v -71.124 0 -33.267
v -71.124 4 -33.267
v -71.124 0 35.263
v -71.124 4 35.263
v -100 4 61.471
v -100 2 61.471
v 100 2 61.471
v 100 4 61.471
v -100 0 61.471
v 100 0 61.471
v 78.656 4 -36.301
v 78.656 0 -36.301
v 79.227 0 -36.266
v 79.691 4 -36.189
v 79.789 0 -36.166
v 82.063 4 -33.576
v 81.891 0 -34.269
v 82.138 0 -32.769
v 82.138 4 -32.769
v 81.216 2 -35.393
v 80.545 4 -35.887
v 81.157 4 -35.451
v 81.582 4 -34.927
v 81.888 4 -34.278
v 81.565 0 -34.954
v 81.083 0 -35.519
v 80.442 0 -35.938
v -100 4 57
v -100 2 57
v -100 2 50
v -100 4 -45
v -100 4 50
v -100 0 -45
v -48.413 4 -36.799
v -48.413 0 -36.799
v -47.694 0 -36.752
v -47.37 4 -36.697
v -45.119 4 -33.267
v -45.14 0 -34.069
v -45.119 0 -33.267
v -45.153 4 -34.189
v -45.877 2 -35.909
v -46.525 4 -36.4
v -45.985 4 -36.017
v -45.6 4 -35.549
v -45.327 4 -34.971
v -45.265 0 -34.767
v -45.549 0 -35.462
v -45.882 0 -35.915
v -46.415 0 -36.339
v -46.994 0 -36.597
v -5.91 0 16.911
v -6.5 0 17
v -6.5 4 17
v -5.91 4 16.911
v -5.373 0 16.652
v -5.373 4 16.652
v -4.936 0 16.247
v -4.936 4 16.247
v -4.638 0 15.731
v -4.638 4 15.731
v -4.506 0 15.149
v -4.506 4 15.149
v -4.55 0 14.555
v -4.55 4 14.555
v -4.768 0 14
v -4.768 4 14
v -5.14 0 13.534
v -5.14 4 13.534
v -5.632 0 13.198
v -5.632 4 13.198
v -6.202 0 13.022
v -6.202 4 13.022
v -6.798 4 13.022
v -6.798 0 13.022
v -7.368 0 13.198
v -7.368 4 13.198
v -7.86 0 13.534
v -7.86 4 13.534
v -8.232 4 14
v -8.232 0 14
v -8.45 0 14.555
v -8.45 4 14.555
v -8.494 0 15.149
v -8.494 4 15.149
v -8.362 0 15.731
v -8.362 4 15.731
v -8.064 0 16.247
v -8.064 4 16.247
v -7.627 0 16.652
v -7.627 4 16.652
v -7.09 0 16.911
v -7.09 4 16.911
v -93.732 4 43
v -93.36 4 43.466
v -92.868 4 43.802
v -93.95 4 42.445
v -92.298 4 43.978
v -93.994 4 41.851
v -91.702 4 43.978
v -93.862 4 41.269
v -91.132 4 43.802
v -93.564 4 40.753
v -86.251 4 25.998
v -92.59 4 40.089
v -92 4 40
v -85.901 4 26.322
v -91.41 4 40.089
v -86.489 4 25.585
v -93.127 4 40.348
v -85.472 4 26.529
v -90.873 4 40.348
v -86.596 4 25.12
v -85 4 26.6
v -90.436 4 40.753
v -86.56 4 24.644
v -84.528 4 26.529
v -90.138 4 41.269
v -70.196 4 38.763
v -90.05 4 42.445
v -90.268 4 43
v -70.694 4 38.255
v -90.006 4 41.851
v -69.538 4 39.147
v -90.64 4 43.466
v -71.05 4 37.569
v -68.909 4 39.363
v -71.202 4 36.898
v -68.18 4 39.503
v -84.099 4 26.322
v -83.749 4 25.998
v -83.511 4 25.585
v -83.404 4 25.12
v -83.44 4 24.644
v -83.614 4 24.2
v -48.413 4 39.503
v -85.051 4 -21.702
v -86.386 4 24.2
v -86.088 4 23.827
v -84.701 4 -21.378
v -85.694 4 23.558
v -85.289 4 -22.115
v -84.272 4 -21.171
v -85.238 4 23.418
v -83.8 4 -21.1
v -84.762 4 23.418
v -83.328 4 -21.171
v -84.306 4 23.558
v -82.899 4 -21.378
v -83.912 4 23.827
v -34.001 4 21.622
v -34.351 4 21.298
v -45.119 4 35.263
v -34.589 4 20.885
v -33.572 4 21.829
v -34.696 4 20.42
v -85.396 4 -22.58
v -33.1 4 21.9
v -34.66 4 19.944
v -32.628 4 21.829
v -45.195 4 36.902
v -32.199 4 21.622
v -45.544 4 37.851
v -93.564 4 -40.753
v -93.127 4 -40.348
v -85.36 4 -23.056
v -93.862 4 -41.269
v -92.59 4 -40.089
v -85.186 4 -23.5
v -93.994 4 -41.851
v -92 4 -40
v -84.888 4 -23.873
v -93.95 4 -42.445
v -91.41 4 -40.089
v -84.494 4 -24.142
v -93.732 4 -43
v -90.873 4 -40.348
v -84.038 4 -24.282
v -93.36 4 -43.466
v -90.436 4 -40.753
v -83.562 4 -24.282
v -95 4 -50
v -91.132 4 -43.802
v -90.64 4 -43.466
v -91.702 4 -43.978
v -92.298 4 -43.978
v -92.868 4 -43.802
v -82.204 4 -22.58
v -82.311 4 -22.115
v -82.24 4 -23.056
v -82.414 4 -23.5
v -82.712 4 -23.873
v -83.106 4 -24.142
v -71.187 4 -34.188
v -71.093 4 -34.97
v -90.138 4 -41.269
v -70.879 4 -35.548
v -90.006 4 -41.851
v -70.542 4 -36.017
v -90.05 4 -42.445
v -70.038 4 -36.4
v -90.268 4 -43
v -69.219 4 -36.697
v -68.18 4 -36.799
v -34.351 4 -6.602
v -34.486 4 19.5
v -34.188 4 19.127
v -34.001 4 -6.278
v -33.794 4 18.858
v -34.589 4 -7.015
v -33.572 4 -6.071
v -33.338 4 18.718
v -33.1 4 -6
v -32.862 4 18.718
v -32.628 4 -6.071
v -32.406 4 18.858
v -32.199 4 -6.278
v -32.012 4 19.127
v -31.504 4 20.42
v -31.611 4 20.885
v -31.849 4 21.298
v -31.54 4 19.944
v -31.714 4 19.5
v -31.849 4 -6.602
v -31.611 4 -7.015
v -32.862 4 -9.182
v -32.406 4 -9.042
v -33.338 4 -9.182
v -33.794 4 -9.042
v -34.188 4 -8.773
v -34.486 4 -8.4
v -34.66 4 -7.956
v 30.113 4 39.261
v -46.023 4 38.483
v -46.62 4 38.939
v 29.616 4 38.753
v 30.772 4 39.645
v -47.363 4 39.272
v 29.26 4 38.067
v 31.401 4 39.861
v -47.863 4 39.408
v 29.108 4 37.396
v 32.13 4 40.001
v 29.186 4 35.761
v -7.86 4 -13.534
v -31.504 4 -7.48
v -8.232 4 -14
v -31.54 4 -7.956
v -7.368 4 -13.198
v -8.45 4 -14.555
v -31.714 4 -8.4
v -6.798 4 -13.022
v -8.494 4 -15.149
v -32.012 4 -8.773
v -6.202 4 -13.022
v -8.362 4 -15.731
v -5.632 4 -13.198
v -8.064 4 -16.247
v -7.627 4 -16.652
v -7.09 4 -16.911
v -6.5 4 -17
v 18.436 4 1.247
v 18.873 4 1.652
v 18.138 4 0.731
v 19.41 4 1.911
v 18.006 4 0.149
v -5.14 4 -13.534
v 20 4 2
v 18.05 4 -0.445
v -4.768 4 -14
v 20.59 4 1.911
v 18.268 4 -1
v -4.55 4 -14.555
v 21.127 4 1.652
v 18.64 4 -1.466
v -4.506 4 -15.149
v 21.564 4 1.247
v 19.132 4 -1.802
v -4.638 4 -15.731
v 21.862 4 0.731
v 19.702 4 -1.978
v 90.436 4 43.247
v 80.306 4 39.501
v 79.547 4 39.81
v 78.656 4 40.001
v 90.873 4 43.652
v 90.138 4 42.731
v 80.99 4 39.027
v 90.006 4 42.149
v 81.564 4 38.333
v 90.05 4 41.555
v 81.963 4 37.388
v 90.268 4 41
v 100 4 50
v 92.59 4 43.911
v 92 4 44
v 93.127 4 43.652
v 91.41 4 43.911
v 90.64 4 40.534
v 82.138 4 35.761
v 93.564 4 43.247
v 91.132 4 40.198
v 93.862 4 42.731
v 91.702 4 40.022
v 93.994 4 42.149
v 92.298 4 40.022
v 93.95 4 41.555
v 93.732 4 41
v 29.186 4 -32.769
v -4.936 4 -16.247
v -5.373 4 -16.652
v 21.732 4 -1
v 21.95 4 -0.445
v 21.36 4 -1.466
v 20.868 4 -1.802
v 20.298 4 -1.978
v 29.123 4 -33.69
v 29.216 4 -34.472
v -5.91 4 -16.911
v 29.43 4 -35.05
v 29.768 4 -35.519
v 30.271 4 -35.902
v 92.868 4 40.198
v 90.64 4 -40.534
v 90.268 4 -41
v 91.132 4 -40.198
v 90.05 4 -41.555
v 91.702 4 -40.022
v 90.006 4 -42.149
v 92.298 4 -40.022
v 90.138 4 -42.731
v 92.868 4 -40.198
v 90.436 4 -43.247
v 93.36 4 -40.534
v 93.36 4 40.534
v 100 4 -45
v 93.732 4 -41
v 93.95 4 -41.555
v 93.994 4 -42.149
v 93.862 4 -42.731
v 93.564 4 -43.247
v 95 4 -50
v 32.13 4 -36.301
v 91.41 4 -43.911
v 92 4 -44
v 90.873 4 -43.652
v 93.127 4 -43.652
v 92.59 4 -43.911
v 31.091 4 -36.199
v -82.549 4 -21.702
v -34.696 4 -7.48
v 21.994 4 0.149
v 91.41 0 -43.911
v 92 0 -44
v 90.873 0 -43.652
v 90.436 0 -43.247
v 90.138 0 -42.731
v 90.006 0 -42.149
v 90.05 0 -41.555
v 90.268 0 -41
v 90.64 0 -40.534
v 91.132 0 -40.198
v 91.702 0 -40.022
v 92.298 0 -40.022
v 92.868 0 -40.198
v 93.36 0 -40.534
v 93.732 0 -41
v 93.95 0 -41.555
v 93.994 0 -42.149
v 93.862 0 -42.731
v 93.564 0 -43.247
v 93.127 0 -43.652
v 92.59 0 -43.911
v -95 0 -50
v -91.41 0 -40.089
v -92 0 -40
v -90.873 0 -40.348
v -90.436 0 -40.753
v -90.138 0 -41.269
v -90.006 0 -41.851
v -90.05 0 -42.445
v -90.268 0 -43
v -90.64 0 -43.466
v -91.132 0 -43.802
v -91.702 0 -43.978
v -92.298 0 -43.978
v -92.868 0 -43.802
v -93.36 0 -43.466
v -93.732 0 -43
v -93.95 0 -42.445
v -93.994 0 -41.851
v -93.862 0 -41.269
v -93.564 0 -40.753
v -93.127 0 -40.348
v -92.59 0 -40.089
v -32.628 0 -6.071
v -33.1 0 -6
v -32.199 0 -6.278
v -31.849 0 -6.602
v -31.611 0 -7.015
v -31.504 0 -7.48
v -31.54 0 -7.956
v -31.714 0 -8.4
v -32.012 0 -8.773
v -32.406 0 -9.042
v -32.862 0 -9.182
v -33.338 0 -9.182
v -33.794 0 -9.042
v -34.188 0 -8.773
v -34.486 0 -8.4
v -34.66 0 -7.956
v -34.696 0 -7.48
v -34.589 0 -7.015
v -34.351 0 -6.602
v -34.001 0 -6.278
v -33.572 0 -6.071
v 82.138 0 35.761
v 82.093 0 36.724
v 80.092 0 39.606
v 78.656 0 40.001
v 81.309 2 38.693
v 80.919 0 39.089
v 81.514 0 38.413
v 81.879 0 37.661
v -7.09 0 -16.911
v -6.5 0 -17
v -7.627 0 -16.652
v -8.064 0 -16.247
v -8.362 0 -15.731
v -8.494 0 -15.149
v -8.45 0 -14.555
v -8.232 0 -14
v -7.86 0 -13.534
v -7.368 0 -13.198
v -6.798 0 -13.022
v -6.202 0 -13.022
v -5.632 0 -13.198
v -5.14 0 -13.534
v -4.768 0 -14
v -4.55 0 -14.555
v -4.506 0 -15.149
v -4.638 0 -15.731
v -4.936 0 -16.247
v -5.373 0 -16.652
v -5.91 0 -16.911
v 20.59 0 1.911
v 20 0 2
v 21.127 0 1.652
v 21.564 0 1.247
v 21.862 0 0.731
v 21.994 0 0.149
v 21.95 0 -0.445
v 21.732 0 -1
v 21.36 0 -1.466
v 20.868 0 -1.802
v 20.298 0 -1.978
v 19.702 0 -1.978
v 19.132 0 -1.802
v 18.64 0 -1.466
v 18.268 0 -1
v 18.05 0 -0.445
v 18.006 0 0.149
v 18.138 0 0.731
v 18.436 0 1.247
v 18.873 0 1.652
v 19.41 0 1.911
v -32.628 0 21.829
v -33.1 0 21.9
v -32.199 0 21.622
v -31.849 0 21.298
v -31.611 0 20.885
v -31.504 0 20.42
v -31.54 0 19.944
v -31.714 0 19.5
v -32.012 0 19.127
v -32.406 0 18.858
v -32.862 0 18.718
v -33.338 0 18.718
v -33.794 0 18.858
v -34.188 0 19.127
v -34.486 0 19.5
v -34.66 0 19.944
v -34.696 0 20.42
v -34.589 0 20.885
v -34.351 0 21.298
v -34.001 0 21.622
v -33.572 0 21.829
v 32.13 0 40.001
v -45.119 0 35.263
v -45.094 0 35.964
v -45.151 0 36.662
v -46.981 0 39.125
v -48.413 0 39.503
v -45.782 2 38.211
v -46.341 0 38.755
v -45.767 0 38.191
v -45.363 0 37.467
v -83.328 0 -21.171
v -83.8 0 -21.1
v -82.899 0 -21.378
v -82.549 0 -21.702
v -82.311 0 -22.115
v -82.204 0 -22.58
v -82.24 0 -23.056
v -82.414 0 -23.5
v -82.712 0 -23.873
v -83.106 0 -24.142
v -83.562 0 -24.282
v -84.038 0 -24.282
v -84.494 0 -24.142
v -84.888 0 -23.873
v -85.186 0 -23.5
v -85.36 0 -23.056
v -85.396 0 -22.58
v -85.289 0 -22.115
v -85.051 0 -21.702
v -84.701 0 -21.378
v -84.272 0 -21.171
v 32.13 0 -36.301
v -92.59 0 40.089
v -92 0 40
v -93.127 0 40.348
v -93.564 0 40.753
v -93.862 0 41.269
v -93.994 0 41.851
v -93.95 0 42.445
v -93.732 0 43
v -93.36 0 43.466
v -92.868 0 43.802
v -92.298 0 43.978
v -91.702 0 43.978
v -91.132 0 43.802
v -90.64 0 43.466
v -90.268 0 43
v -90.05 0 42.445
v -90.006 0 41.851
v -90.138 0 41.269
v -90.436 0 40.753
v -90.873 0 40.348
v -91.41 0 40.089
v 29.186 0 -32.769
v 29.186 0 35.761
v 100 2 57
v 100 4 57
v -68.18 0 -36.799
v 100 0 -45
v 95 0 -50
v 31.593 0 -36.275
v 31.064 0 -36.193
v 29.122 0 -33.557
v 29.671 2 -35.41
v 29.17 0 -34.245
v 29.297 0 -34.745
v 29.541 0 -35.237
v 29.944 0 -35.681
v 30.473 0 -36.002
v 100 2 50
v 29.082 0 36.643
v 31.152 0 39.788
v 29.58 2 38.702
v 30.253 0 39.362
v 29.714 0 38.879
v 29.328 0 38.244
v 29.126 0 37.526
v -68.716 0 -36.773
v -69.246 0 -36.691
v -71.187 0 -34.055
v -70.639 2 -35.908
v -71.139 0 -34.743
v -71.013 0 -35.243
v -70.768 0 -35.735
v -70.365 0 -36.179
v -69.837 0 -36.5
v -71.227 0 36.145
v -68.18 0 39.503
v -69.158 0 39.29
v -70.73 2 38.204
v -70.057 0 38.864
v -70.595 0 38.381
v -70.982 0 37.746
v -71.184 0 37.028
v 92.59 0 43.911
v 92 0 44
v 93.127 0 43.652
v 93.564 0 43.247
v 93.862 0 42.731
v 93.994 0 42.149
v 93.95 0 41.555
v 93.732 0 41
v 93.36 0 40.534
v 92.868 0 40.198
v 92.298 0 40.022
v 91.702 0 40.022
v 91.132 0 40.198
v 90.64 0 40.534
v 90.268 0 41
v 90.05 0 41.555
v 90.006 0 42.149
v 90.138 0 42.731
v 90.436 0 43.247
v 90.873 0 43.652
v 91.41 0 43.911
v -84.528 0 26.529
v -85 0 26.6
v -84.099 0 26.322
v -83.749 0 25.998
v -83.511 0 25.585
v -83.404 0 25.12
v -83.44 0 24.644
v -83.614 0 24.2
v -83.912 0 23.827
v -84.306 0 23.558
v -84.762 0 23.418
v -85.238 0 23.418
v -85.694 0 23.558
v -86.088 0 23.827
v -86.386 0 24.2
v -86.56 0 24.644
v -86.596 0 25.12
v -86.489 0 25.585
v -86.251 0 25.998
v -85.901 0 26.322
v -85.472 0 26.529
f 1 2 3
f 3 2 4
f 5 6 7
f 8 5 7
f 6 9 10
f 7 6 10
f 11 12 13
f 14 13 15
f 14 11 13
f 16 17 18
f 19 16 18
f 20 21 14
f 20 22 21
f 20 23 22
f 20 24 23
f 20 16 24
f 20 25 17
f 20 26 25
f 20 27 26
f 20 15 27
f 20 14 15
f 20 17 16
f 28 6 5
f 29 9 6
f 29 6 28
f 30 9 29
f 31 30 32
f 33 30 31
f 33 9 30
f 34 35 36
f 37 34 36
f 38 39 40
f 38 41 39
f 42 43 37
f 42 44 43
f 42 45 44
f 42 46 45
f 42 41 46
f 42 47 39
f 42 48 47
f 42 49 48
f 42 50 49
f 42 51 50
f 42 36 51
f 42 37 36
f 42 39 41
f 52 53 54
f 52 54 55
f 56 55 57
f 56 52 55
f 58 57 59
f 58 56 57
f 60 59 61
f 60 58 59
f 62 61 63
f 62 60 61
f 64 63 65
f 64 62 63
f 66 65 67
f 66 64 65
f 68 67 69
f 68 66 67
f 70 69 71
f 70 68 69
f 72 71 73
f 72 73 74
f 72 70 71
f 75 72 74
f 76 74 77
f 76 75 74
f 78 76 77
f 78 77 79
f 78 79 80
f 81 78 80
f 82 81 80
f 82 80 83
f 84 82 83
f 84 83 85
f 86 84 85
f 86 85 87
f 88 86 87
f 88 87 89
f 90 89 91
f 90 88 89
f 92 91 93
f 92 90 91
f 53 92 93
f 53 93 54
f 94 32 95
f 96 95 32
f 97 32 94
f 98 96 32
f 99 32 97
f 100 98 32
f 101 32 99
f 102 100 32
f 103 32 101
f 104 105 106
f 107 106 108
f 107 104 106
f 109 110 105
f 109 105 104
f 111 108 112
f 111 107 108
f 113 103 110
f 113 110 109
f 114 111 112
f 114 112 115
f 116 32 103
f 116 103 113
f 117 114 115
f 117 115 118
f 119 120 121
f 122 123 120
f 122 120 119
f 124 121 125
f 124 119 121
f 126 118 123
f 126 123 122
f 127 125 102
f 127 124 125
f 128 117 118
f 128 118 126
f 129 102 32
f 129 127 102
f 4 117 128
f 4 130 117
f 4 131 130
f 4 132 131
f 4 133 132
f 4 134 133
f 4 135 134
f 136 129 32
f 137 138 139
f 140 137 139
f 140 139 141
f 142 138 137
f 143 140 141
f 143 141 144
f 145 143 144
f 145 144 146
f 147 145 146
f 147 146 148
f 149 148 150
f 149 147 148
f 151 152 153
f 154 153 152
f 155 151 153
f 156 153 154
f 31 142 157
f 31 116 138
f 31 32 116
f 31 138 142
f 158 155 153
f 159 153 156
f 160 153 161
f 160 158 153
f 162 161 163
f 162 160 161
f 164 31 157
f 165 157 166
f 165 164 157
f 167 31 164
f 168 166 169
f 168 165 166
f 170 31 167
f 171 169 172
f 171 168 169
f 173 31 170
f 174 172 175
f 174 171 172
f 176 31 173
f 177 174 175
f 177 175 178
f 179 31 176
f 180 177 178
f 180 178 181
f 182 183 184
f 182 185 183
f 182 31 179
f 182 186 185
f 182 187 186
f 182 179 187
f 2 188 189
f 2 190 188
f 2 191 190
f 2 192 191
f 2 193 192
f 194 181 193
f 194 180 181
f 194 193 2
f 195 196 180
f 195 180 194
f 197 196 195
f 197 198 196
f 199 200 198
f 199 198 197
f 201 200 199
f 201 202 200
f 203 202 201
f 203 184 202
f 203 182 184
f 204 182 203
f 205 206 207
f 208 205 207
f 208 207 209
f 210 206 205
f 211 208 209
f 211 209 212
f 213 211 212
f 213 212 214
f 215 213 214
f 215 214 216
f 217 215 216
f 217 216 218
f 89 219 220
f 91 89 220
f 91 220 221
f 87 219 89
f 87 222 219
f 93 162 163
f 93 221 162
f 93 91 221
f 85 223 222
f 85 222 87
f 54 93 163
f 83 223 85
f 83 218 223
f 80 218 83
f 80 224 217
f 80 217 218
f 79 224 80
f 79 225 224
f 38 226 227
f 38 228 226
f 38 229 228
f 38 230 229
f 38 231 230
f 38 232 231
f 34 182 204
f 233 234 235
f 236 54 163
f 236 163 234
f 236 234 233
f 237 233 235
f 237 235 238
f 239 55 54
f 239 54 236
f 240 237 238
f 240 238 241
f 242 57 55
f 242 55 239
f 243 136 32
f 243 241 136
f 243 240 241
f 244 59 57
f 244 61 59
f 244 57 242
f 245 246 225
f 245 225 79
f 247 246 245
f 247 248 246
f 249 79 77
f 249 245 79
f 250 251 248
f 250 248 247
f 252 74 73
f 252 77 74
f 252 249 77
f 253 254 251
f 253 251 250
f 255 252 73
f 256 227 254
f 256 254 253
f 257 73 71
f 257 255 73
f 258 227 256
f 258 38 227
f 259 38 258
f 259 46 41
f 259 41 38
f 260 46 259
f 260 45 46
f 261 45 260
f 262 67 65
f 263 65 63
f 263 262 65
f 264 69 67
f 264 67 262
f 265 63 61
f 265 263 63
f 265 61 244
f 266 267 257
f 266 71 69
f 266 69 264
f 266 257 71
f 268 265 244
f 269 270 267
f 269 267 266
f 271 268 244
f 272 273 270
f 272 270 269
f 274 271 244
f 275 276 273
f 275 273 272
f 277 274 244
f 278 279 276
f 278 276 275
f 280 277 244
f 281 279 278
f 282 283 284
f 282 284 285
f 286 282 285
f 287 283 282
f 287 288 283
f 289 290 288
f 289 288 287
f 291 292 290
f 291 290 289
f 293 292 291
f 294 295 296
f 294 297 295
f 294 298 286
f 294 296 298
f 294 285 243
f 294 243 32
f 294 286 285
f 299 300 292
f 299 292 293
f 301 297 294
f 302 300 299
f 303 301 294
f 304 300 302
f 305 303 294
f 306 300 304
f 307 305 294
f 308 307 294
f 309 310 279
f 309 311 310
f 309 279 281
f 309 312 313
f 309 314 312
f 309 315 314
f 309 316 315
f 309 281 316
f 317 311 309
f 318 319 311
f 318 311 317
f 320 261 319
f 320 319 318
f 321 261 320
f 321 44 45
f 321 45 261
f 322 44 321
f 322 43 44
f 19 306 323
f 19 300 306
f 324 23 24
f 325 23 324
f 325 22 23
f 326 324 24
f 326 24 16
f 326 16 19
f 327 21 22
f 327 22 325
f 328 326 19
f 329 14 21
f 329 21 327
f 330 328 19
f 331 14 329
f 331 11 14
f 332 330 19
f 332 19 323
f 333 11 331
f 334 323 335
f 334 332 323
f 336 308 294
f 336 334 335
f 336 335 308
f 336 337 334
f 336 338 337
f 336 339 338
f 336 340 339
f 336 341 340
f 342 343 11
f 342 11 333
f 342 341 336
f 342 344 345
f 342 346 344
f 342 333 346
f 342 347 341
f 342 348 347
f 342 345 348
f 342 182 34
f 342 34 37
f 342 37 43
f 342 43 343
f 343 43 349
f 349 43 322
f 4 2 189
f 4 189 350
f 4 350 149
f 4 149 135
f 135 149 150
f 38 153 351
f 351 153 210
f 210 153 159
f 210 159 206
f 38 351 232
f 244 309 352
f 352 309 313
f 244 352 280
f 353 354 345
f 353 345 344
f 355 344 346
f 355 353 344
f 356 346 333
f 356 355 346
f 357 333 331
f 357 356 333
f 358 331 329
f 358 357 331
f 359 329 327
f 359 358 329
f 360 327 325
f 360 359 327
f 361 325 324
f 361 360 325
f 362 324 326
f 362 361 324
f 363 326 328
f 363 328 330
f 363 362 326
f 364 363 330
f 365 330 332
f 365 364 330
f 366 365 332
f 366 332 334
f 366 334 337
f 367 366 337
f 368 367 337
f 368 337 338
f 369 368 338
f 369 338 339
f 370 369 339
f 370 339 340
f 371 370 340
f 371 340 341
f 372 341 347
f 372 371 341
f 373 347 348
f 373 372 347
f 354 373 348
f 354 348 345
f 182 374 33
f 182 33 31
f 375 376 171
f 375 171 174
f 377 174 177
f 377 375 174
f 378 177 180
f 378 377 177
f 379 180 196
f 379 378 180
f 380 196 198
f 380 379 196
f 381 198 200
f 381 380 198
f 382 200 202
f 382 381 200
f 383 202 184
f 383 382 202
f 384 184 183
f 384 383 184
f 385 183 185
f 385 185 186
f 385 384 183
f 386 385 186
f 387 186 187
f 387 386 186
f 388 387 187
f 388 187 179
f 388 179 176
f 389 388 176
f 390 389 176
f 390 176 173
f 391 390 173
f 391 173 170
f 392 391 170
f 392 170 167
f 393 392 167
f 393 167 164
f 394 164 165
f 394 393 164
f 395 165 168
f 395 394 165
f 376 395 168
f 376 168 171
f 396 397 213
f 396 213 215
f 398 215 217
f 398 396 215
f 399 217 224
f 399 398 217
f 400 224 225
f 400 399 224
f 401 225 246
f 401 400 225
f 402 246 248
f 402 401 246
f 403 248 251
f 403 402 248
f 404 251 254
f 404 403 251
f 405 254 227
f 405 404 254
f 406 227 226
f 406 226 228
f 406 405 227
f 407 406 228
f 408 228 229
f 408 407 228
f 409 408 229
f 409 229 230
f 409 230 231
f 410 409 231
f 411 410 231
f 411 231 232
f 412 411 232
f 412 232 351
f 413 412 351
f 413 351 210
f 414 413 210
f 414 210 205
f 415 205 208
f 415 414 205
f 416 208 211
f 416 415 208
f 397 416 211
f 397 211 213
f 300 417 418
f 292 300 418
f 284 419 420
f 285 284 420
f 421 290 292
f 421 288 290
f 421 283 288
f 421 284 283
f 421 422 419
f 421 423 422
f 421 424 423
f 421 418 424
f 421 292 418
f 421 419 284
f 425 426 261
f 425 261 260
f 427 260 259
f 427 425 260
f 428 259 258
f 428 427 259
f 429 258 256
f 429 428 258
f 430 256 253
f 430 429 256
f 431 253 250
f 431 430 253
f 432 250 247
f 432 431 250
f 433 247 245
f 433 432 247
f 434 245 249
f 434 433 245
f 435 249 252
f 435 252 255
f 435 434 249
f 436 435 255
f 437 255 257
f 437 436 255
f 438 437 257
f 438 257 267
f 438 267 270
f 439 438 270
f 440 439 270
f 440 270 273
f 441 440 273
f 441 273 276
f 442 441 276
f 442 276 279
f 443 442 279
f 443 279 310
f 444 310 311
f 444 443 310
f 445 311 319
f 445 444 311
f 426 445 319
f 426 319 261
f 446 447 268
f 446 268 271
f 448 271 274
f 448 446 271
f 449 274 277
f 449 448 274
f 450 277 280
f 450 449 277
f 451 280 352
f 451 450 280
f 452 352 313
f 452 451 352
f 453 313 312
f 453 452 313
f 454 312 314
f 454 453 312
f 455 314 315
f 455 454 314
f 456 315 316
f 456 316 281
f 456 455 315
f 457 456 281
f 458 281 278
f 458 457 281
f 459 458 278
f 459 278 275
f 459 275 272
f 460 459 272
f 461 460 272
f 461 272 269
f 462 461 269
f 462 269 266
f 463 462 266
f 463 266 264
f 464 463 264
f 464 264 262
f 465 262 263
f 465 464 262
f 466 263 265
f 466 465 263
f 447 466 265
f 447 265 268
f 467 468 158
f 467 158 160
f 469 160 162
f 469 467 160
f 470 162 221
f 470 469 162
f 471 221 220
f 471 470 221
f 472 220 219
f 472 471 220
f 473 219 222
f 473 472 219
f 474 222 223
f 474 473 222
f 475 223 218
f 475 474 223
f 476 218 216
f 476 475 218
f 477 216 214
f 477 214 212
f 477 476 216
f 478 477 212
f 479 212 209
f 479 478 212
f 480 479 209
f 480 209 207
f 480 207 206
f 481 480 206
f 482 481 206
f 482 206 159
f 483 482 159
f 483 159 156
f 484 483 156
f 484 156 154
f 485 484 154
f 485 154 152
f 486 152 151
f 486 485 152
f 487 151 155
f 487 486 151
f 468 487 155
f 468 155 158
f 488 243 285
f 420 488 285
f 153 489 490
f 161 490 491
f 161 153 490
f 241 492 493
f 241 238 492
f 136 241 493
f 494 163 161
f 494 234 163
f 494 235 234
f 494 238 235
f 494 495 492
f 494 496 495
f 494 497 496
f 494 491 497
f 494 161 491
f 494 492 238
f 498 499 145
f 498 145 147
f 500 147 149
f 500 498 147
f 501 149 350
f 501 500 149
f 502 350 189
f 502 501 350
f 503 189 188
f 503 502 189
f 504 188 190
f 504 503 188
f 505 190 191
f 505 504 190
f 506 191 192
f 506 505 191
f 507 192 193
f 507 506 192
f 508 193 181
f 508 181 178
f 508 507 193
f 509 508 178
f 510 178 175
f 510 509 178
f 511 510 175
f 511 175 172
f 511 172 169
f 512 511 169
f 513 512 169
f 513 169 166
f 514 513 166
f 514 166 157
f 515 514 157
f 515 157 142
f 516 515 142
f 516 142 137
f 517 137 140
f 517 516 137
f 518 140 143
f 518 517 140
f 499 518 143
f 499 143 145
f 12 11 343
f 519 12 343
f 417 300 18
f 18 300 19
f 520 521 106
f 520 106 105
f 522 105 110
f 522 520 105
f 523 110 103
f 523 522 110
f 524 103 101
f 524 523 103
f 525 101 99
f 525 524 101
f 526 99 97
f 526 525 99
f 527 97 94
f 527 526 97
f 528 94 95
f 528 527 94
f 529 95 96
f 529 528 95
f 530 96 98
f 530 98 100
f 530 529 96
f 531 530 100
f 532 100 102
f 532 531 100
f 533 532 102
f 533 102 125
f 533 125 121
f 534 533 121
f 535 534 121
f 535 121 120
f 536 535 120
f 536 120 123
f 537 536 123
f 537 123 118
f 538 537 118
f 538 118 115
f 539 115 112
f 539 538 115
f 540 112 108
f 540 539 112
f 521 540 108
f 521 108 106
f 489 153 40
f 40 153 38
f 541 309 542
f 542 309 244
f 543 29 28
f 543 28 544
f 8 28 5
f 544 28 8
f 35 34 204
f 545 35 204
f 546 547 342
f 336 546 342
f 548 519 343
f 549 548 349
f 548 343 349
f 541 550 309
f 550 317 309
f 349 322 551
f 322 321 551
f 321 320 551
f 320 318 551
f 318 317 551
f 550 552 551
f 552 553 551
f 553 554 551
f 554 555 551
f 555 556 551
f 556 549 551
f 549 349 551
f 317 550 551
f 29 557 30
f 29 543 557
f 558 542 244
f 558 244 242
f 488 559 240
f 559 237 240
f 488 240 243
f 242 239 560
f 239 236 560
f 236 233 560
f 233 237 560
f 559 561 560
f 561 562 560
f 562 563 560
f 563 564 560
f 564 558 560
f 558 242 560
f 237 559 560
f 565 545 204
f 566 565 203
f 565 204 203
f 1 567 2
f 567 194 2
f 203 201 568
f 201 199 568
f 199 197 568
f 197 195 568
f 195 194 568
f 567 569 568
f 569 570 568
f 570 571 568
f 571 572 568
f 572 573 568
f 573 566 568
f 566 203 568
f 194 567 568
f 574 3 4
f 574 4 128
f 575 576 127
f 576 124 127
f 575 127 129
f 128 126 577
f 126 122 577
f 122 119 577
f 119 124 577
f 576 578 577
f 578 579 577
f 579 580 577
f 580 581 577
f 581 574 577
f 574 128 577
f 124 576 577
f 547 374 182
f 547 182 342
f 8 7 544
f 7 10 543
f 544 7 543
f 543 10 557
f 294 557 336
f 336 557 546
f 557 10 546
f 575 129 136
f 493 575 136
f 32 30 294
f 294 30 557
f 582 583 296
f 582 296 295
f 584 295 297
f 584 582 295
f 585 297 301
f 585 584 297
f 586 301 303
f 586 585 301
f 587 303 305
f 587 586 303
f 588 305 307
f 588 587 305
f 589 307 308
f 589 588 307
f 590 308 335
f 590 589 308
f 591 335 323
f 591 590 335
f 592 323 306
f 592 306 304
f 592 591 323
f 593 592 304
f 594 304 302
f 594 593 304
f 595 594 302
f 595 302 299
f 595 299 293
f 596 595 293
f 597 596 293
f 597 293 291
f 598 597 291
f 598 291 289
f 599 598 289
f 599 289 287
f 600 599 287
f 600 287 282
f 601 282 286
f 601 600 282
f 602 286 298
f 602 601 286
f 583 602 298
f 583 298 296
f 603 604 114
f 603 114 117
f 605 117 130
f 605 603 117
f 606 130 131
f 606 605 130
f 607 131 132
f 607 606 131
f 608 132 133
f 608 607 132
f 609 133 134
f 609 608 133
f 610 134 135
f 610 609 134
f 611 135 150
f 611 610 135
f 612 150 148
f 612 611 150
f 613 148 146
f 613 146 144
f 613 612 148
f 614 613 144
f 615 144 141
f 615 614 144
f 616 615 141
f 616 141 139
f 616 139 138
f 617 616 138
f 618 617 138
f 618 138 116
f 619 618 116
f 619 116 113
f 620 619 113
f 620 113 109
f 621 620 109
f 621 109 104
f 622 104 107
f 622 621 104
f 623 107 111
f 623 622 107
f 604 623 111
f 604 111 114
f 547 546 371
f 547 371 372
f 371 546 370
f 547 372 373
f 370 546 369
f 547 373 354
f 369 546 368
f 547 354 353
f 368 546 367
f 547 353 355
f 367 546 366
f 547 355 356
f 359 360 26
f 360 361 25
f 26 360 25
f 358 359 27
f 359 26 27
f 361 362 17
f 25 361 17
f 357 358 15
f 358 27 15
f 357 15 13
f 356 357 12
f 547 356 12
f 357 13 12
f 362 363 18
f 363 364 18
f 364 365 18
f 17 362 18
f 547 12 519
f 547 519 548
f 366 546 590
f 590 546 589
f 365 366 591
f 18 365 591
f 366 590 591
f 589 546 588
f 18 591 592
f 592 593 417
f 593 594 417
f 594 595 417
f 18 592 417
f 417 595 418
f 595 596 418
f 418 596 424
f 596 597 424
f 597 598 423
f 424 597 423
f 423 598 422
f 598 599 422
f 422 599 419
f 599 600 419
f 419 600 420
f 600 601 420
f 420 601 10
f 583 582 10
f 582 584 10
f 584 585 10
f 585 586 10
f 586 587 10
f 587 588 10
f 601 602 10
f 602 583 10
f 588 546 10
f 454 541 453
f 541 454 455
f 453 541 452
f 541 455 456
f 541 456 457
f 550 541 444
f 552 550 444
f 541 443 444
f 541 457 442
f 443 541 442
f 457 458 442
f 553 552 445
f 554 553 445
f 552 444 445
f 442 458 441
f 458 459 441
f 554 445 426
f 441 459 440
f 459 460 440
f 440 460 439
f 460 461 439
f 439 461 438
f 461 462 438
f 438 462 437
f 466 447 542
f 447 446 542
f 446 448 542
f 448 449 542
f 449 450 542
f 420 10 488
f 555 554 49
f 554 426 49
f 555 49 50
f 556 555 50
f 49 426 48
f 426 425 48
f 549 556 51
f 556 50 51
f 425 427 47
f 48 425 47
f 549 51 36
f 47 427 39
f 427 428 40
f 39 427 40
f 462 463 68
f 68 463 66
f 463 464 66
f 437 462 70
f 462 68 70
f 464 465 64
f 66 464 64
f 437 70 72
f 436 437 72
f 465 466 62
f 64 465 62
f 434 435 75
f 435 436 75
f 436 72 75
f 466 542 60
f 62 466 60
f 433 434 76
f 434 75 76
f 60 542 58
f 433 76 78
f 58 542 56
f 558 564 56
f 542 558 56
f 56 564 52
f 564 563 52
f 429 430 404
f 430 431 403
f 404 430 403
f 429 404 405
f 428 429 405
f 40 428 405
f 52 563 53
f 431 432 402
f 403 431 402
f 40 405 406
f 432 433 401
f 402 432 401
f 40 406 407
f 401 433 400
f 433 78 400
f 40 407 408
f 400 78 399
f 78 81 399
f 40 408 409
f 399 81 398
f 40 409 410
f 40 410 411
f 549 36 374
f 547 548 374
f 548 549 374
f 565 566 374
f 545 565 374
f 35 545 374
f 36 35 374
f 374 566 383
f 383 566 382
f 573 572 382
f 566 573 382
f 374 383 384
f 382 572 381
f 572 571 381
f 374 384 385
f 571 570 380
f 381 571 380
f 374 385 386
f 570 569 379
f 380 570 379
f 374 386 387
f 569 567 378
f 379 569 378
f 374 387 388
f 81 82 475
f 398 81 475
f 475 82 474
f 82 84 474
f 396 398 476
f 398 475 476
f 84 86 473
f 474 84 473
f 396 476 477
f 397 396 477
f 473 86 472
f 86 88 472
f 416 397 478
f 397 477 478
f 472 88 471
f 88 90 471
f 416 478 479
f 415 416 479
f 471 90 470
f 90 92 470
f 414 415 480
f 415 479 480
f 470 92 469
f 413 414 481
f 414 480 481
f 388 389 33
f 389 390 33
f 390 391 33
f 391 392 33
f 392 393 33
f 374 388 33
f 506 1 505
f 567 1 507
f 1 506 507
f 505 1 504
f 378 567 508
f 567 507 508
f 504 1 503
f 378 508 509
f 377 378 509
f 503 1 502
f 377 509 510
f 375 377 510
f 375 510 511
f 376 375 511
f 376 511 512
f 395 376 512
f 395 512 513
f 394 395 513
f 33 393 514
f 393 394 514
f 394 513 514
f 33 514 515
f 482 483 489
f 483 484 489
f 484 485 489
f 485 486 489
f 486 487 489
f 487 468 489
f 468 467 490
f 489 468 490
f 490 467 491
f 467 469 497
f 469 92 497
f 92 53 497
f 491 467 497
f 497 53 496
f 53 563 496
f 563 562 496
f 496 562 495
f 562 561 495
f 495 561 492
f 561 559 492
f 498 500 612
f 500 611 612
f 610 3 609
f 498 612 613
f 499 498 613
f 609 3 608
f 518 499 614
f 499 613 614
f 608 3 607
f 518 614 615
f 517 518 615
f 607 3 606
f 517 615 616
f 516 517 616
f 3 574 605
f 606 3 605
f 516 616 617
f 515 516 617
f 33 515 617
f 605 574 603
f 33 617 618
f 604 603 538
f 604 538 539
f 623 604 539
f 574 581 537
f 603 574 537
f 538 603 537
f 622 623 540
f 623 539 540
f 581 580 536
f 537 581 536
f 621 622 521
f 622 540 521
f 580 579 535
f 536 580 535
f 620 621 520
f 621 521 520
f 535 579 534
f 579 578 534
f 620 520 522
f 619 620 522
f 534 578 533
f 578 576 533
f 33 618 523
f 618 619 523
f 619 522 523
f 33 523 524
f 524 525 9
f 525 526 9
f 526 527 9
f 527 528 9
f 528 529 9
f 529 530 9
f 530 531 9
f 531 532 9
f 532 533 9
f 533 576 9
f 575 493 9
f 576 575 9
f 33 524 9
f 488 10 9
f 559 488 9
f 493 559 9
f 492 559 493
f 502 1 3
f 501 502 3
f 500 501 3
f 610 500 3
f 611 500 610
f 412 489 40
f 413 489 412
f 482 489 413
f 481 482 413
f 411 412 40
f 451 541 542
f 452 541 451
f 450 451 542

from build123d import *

# Parameters (mm, degrees)
ESQUISSE1_W             = 200
ESQUISSE1_H             = 100
ESQUISSE1_R             = 2
ESQUISSE1_R_2           = 1.6
BOSS_EXTRU_1_DEPTH      = 4
ENL_V_MAT_EXTRU_1_DEPTH = 10
BOSS_EXTRU_2_DEPTH      = 2
ESQUISSE4_W             = 200
ESQUISSE4_H             = 4.471345155
BOSS_EXTRU_3_DEPTH      = 2
CHANFREIN1_SIZE         = 5


with BuildPart() as part:
    # Esquisse1 → Boss.-Extru.1 (new body)
    with BuildSketch(Plane(origin=(0, 0, 0), x_dir=(1, 0, 0), z_dir=(0, 1, 0))):
        Rectangle(ESQUISSE1_W, ESQUISSE1_H)
        with Locations(Location((-92, 42, 0), (0, 0, 270))):
            Circle(ESQUISSE1_R, mode=Mode.SUBTRACT)
        with Locations(Location((92, 42, 0), (0, 0, 90))):
            Circle(ESQUISSE1_R, mode=Mode.SUBTRACT)
        with Locations(Location((92, -42, 0), (0, 0, 270))):
            Circle(ESQUISSE1_R, mode=Mode.SUBTRACT)
        with Locations(Location((-92, -42, 0), (0, 0, 90))):
            Circle(ESQUISSE1_R, mode=Mode.SUBTRACT)
        with Locations(Location((-6.5, -15, 0), (0, 0, 270))):
            Circle(ESQUISSE1_R, mode=Mode.SUBTRACT)
        with Locations(Location((20, 0, 0), (0, 0, 270))):
            Circle(ESQUISSE1_R, mode=Mode.SUBTRACT)
        with Locations(Location((-6.5, 15, 0), (0, 0, 90))):
            Circle(ESQUISSE1_R, mode=Mode.SUBTRACT)
        with Locations(Location((-33.1, -20.3, 0), (0, 0, 270))):
            Circle(ESQUISSE1_R_2, mode=Mode.SUBTRACT)
        with Locations(Location((-33.1, 7.6, 0), (0, 0, 270))):
            Circle(ESQUISSE1_R_2, mode=Mode.SUBTRACT)
        with Locations(Location((-85, -25, 0), (0, 0, 270))):
            Circle(ESQUISSE1_R_2, mode=Mode.SUBTRACT)
        with Locations(Location((-83.8, 22.7, 0), (0, 0, 270))):
            Circle(ESQUISSE1_R_2, mode=Mode.SUBTRACT)
    extrude(amount=BOSS_EXTRU_1_DEPTH)

    # Esquisse2 → Enlèv. mat.-Extru.1 (cut)
    with BuildSketch(Plane(origin=(0, 4, 0), x_dir=(1, 0, 0), z_dir=(0, 1, 0))):
        with BuildLine():
            Line((-71.12395108, 33.267340446), (-71.12395108, -35.262942493))
            add(Edge.make_bspline(
                [(-71.12395108, -35.262942493), (-71.80811413, -39.025609189), (-68.179899303, -39.50320708)],
                knots=[0, 0, 0, 1, 1, 1], degree=2))
            Line((-68.179899303, -39.50320708), (-48.41260505, -39.50320708))
            add(Edge.make_bspline(
                [(-45.119156215, -35.262942493), (-44.797316754, -39.038148597), (-48.41260505, -39.50320708)],
                knots=[0, 0, 0, 1, 1, 1], degree=2))
            Line((-45.119156215, -35.262942493), (-45.119156215, 33.267340446))
            add(Edge.make_bspline(
                [(-48.41260505, 36.799015417), (-44.987803153, 36.784833779), (-45.119156215, 33.267340446)],
                knots=[0, 0, 0, 1, 1, 1], degree=2))
            Line((-48.41260505, 36.799015417), (-68.179899303, 36.799015417))
            add(Edge.make_bspline(
                [(-68.179899303, 36.799015417), (-71.625685069, 36.783683635), (-71.12395108, 33.267340446)],
                knots=[0, 0, 0, 1, 1, 1], degree=2))
        make_face()
        with BuildLine():
            Line((29.185631994, 32.76936094), (29.185631994, -35.760921998))
            add(Edge.make_bspline(
                [(29.185631994, -35.760921998), (28.501468944, -39.523588695), (32.129683771, -40.001186586)],
                knots=[0, 0, 0, 1, 1, 1], degree=2))
            Line((32.129683771, -40.001186586), (78.655845139, -40.001186586))
            add(Edge.make_bspline(
                [(82.138089103, -35.760921998), (82.221370803, -39.504216764), (78.655845139, -40.001186586)],
                knots=[0, 0, 0, 1, 1, 1], degree=2))
            Line((82.138089103, -35.760921998), (82.138089103, 32.76936094))
            add(Edge.make_bspline(
                [(78.655845139, 36.301035912), (82.034782777, 36.251456851), (82.138089103, 32.76936094)],
                knots=[0, 0, 0, 1, 1, 1], degree=2))
            Line((78.655845139, 36.301035912), (32.129683771, 36.301035912))
            add(Edge.make_bspline(
                [(32.129683771, 36.301035912), (28.683898005, 36.28570413), (29.185631994, 32.76936094)],
                knots=[0, 0, 0, 1, 1, 1], degree=2))
        make_face()
    extrude(amount=-ENL_V_MAT_EXTRU_1_DEPTH, mode=Mode.SUBTRACT)

    # Esquisse3 → Boss.-Extru.2 (add)
    with BuildSketch(Plane.XZ):
        Polygon((-100, 50), (-100, 61.471345155), (0, 61.471345155), (100, 61.471345155), (100, 50), align=None)
    extrude(amount=-BOSS_EXTRU_2_DEPTH)

    # Esquisse4 → Boss.-Extru.3 (add)
    with BuildSketch(Plane(origin=(0, 2, 0), x_dir=(1, 0, 0), z_dir=(0, 1, 0))):
        with Locations((0, -59.235672577)):
            Rectangle(ESQUISSE4_W, ESQUISSE4_H)
    extrude(amount=BOSS_EXTRU_3_DEPTH)

    # Chanfrein1
    chanfrein1_edges = [part.edges().sort_by_distance(p)[0] for p in [
        (-100, 2, -50),
        (100, 2, -50),
    ]]
    chamfer(chanfrein1_edges, length=CHANFREIN1_SIZE)


solid = part.part
